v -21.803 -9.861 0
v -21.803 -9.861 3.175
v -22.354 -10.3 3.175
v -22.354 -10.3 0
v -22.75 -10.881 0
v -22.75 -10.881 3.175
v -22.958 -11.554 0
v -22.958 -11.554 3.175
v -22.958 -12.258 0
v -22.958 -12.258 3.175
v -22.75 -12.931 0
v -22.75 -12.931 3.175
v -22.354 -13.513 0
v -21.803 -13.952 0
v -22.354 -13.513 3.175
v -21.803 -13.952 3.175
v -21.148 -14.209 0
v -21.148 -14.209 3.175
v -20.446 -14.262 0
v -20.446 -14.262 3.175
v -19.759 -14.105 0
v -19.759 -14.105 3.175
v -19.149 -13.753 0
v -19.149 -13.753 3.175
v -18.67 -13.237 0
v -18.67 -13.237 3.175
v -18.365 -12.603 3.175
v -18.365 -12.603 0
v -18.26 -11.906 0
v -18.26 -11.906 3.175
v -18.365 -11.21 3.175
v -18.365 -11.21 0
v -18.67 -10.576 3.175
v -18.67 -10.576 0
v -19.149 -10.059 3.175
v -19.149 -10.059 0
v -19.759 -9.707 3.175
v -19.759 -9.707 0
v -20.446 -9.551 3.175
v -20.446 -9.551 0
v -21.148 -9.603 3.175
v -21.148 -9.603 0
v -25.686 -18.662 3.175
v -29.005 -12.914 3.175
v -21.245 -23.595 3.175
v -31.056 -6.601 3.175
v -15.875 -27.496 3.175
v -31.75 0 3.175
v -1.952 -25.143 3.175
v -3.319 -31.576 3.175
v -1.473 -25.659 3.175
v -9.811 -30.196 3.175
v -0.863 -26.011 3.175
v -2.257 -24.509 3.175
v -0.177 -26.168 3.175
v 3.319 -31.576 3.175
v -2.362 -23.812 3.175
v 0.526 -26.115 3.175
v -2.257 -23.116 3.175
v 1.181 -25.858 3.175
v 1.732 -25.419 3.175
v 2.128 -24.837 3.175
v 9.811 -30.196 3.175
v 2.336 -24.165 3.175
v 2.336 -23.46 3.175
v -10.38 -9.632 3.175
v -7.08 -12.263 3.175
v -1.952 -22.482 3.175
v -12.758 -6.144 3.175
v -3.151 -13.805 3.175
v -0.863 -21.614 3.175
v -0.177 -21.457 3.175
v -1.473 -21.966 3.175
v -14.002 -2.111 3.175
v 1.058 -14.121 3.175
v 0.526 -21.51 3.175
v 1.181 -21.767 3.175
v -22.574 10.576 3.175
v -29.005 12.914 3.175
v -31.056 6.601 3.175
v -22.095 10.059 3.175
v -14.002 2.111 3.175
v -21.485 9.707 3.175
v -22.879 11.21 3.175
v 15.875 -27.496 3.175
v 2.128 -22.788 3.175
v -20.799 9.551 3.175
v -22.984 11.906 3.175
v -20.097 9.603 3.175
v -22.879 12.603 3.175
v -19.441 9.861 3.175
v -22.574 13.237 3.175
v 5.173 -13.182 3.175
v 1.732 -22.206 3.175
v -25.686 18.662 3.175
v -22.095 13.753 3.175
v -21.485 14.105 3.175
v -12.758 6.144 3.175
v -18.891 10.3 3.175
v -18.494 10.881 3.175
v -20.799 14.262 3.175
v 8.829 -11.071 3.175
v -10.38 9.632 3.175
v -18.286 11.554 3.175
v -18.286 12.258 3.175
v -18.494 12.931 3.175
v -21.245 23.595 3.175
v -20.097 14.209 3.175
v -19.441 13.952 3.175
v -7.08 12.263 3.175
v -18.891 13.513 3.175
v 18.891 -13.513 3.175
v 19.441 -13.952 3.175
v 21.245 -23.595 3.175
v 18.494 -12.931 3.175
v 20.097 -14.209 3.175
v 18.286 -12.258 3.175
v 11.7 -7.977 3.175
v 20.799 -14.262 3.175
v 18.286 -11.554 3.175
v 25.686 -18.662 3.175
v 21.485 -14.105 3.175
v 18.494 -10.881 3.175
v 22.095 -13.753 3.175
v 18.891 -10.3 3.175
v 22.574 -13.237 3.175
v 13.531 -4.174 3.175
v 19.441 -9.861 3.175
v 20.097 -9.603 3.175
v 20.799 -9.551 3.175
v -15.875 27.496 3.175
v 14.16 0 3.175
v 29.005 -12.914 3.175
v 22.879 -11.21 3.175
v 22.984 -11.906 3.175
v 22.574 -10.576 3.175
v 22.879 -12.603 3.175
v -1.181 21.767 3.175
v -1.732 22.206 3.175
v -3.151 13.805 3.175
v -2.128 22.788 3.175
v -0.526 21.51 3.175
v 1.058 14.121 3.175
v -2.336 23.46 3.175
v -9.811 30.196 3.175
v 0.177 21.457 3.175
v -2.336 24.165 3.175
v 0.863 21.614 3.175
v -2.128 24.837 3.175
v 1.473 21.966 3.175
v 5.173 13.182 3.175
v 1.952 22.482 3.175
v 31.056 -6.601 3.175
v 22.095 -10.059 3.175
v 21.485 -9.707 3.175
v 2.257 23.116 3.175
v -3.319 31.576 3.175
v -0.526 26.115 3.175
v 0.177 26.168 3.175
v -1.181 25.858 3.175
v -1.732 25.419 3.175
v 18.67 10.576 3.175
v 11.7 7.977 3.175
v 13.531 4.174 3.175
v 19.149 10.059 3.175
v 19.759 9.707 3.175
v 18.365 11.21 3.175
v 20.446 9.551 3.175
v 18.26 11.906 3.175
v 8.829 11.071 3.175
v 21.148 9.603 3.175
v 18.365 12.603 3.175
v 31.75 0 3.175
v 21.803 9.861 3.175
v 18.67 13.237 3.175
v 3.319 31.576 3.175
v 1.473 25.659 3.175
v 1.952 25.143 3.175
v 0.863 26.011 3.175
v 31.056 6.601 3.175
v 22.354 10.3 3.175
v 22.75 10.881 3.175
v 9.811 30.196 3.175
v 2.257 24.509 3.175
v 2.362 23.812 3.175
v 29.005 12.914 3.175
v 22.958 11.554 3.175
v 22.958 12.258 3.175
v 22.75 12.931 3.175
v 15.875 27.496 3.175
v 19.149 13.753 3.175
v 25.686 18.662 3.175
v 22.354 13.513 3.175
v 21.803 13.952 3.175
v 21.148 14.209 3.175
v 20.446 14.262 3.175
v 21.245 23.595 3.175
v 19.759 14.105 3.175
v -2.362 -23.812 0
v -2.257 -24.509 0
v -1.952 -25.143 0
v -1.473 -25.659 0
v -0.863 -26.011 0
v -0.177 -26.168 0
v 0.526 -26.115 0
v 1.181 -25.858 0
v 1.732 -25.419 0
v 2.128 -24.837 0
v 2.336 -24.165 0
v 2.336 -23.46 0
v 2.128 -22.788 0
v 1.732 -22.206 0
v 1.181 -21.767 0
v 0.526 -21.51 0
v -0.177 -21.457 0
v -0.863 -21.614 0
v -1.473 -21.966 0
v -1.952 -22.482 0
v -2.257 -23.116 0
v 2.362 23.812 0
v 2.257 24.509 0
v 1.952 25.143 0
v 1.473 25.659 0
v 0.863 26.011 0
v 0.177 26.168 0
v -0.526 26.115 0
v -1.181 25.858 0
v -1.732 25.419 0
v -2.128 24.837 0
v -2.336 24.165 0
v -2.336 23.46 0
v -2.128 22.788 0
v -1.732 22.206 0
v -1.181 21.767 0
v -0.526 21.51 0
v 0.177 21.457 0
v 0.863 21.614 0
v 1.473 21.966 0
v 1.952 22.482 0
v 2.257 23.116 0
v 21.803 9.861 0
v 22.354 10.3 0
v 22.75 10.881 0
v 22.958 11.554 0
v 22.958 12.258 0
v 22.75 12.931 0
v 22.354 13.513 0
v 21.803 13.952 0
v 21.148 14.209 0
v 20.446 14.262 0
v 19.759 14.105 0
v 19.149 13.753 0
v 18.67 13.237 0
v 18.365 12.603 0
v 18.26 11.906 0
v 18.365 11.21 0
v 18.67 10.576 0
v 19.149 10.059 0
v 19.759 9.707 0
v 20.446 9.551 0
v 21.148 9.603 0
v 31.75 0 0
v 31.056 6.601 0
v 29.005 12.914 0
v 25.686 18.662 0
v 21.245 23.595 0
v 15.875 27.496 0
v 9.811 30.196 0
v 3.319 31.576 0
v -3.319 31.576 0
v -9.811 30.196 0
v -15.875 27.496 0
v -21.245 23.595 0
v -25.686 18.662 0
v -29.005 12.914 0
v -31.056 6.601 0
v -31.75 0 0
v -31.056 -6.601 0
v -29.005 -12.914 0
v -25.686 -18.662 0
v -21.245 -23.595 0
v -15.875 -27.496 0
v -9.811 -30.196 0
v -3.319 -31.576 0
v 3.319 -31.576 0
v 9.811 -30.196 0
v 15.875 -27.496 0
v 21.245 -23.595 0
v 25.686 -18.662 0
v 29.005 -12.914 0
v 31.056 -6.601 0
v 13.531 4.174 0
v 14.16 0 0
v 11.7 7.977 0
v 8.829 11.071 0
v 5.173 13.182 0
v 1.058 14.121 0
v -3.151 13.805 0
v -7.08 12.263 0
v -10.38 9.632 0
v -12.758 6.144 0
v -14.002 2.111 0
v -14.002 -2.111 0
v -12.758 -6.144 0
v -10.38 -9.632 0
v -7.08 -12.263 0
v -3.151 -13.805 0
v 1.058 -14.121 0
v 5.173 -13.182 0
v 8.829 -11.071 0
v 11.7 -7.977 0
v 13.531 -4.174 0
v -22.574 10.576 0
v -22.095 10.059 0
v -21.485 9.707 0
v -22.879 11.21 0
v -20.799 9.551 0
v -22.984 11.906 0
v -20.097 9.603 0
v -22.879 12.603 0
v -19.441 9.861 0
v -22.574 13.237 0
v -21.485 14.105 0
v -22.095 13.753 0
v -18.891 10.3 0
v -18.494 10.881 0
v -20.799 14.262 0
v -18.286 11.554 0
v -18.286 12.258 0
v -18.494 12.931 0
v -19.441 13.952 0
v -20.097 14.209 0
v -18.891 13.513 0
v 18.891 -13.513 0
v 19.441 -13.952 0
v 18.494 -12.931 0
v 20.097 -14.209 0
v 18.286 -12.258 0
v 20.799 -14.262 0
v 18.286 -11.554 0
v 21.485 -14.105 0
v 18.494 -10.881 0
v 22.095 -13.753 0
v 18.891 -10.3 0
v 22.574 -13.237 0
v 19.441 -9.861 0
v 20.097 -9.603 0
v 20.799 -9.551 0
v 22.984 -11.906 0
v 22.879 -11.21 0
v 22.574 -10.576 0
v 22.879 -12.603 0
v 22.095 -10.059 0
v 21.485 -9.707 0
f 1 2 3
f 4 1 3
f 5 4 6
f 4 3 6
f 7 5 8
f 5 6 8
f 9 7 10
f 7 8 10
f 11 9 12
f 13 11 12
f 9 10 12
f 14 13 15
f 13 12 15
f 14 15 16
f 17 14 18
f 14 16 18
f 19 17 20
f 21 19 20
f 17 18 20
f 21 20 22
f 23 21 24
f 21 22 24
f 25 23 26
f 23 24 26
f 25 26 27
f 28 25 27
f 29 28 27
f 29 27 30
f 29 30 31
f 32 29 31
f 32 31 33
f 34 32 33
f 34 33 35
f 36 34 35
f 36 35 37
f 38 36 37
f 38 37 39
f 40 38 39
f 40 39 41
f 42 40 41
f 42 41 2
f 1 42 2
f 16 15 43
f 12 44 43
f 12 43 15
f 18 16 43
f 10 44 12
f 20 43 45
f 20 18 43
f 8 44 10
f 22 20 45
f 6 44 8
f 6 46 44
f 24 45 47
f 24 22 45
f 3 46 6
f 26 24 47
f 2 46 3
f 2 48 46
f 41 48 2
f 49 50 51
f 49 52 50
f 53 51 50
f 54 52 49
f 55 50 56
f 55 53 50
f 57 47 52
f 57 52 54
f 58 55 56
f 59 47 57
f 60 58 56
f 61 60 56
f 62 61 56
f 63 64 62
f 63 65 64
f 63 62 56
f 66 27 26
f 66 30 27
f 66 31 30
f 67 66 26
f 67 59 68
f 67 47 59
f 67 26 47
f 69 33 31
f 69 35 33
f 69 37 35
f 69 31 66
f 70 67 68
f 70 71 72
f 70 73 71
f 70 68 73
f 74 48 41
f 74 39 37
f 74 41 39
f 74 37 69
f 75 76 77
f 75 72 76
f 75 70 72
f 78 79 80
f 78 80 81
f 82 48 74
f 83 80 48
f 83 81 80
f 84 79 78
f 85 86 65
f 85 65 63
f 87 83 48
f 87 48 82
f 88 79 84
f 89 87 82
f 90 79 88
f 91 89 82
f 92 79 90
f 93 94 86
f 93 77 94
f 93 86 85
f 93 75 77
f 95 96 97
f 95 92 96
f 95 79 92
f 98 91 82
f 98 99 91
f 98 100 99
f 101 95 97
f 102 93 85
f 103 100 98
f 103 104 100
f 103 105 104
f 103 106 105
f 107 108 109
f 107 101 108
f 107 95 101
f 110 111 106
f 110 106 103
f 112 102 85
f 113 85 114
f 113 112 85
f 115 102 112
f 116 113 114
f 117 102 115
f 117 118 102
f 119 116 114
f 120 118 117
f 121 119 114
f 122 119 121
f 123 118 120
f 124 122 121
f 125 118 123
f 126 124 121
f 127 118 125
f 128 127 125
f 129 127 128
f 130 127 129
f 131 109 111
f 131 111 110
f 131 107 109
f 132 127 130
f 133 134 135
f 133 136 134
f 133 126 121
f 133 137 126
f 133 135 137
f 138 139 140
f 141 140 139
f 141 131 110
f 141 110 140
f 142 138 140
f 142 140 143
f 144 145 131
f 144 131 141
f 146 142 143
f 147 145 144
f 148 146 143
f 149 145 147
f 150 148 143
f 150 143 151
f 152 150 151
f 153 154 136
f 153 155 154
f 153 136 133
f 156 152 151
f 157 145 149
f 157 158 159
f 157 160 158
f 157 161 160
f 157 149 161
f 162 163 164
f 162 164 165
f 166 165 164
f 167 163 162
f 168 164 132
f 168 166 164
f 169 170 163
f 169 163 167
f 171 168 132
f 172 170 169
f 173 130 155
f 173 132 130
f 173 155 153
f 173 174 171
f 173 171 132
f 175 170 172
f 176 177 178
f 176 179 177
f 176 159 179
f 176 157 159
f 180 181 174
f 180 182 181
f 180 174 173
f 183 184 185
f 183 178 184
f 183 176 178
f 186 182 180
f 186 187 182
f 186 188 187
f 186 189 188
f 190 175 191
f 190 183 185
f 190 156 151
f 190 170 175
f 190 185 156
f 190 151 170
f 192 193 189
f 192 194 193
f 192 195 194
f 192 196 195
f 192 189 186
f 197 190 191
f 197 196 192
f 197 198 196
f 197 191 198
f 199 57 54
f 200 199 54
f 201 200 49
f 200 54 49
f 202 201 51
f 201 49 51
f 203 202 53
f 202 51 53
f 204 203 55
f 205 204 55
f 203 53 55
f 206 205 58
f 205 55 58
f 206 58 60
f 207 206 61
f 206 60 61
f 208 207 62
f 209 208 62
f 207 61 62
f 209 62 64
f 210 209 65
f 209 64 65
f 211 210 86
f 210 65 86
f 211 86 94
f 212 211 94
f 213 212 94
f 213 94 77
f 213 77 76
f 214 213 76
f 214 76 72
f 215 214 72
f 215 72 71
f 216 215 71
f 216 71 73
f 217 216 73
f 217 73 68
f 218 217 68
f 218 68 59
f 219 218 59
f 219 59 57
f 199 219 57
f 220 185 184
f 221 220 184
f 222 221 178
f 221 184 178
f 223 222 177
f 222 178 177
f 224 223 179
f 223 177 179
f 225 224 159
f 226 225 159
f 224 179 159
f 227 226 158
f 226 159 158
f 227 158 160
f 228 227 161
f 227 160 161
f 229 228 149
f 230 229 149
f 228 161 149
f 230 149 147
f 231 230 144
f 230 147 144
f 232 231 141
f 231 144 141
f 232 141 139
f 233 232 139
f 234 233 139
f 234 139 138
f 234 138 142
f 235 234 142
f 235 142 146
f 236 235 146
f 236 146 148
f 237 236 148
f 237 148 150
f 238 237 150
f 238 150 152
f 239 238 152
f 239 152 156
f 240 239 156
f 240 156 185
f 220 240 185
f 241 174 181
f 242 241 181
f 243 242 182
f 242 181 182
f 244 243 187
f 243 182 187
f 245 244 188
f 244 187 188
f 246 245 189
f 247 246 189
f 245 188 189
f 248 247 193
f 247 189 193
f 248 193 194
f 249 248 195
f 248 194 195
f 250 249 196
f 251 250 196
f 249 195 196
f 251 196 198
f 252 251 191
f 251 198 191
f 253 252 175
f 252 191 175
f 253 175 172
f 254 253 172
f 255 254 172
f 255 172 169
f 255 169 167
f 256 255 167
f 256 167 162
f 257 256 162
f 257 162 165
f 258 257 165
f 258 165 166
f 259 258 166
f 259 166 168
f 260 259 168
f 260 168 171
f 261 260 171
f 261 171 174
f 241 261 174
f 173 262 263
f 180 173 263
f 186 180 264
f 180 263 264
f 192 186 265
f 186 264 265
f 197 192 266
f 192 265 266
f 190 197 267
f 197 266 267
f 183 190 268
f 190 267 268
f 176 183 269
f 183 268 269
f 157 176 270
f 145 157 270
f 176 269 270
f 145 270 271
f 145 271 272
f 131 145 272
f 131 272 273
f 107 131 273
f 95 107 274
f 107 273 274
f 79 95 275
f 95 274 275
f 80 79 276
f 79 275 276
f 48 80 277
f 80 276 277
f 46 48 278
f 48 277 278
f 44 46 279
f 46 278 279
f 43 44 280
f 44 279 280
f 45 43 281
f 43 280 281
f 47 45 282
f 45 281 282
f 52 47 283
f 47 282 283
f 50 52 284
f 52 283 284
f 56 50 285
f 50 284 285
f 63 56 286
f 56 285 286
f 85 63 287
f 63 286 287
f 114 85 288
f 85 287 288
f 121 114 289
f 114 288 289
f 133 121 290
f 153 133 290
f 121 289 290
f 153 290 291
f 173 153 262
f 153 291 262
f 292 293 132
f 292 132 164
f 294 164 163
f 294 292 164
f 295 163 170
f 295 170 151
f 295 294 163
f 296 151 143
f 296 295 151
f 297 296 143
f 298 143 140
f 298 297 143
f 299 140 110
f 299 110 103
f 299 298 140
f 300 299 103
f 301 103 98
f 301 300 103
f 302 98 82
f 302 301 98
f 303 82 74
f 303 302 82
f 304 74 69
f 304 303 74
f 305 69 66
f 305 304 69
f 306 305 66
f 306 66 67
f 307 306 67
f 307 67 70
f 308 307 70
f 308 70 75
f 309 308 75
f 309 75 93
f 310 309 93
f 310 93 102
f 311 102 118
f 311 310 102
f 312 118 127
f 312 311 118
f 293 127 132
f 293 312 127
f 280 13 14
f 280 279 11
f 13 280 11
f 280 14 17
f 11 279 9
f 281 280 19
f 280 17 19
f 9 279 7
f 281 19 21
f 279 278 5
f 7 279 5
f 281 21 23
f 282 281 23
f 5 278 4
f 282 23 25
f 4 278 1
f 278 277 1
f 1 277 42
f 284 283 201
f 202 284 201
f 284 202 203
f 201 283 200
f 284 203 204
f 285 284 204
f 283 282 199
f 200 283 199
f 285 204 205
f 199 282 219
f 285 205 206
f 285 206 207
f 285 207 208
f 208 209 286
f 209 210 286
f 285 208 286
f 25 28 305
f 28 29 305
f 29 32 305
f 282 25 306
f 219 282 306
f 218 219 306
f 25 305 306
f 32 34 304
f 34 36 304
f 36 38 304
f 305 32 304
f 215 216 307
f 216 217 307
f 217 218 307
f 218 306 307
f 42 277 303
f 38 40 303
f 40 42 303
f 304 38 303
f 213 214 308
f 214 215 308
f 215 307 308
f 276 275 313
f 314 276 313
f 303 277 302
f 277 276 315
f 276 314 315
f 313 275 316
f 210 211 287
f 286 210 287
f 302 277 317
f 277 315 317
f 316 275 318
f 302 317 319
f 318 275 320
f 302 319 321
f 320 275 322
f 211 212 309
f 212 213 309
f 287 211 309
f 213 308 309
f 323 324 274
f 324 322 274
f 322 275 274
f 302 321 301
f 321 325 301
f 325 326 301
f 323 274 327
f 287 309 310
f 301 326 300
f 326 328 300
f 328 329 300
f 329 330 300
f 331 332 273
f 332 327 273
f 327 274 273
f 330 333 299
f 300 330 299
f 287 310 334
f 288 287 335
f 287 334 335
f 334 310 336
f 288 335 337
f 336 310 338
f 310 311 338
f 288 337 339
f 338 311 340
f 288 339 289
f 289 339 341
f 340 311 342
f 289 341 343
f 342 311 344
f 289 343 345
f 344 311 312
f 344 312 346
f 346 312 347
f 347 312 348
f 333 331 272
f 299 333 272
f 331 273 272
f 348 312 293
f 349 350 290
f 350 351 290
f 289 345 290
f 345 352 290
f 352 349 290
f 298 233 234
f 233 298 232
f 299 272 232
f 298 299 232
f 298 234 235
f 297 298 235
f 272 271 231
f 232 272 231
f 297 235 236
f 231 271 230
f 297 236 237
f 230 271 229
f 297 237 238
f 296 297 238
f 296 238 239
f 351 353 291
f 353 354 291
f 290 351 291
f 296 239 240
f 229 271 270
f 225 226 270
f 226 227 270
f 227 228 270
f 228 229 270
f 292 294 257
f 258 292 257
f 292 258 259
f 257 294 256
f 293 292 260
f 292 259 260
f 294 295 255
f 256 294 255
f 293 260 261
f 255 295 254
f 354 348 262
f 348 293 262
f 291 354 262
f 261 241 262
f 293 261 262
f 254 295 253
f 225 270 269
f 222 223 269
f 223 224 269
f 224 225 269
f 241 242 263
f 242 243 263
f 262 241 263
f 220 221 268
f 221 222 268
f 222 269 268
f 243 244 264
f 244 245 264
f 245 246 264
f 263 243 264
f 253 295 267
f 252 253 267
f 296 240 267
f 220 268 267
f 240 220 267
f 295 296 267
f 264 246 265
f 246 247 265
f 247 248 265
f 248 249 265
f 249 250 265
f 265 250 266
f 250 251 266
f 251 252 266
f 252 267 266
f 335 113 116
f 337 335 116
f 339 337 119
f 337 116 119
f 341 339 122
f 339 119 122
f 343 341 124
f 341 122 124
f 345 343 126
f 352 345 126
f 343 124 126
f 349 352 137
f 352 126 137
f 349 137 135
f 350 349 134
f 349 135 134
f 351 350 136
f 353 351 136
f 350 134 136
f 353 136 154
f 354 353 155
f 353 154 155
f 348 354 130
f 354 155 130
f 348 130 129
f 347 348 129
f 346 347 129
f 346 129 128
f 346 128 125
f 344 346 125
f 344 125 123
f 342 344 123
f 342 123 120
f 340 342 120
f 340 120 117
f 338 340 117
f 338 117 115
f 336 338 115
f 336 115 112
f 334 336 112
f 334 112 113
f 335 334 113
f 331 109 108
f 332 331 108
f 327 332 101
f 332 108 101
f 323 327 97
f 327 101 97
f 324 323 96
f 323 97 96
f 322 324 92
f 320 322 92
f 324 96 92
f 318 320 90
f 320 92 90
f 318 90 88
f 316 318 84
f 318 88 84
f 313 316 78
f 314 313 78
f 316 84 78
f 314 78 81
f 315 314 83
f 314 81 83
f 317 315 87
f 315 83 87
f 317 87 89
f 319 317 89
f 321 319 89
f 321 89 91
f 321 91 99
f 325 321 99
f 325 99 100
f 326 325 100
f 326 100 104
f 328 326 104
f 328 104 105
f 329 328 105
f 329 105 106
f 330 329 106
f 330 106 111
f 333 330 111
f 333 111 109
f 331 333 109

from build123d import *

# Parameters (mm, degrees)
F0_R            = 31.75
F0_R_2          = 14.1605
F1_DEPTH        = 3.175
F2_R            = 2.3622
F3_DEPTH        = 3.176
F3_COPIES_COUNT = 6


# Not quite as in the source:
# - a pattern or mirror of a feature is missing from the dataset's text; its kind, count and spacing are read off the source's solid


with BuildPart() as f1:
    # F0 (on Top) → F1 (new body)
    with BuildSketch(Plane.XY):
        Circle(F0_R)
        Circle(F0_R_2, mode=Mode.SUBTRACT)
    extrude(amount=F1_DEPTH)

    # F2 (on face) → F3 (cut, through all)
    with BuildSketch(Plane.XY.offset(3.175)):
        with Locations((0, 23.8125)):
            Circle(F2_R)
    f3 = extrude(amount=-F3_DEPTH, mode=Mode.SUBTRACT)

    # F3_copies: F3 ×6 about axis
    f3_copies_axis = Axis((0, 0, 0), (0, 0, 1))
    for i in range(1, F3_COPIES_COUNT):
        add(f3.rotate(f3_copies_axis, i * 360 / F3_COPIES_COUNT), mode=Mode.SUBTRACT)


solid = f1.part
